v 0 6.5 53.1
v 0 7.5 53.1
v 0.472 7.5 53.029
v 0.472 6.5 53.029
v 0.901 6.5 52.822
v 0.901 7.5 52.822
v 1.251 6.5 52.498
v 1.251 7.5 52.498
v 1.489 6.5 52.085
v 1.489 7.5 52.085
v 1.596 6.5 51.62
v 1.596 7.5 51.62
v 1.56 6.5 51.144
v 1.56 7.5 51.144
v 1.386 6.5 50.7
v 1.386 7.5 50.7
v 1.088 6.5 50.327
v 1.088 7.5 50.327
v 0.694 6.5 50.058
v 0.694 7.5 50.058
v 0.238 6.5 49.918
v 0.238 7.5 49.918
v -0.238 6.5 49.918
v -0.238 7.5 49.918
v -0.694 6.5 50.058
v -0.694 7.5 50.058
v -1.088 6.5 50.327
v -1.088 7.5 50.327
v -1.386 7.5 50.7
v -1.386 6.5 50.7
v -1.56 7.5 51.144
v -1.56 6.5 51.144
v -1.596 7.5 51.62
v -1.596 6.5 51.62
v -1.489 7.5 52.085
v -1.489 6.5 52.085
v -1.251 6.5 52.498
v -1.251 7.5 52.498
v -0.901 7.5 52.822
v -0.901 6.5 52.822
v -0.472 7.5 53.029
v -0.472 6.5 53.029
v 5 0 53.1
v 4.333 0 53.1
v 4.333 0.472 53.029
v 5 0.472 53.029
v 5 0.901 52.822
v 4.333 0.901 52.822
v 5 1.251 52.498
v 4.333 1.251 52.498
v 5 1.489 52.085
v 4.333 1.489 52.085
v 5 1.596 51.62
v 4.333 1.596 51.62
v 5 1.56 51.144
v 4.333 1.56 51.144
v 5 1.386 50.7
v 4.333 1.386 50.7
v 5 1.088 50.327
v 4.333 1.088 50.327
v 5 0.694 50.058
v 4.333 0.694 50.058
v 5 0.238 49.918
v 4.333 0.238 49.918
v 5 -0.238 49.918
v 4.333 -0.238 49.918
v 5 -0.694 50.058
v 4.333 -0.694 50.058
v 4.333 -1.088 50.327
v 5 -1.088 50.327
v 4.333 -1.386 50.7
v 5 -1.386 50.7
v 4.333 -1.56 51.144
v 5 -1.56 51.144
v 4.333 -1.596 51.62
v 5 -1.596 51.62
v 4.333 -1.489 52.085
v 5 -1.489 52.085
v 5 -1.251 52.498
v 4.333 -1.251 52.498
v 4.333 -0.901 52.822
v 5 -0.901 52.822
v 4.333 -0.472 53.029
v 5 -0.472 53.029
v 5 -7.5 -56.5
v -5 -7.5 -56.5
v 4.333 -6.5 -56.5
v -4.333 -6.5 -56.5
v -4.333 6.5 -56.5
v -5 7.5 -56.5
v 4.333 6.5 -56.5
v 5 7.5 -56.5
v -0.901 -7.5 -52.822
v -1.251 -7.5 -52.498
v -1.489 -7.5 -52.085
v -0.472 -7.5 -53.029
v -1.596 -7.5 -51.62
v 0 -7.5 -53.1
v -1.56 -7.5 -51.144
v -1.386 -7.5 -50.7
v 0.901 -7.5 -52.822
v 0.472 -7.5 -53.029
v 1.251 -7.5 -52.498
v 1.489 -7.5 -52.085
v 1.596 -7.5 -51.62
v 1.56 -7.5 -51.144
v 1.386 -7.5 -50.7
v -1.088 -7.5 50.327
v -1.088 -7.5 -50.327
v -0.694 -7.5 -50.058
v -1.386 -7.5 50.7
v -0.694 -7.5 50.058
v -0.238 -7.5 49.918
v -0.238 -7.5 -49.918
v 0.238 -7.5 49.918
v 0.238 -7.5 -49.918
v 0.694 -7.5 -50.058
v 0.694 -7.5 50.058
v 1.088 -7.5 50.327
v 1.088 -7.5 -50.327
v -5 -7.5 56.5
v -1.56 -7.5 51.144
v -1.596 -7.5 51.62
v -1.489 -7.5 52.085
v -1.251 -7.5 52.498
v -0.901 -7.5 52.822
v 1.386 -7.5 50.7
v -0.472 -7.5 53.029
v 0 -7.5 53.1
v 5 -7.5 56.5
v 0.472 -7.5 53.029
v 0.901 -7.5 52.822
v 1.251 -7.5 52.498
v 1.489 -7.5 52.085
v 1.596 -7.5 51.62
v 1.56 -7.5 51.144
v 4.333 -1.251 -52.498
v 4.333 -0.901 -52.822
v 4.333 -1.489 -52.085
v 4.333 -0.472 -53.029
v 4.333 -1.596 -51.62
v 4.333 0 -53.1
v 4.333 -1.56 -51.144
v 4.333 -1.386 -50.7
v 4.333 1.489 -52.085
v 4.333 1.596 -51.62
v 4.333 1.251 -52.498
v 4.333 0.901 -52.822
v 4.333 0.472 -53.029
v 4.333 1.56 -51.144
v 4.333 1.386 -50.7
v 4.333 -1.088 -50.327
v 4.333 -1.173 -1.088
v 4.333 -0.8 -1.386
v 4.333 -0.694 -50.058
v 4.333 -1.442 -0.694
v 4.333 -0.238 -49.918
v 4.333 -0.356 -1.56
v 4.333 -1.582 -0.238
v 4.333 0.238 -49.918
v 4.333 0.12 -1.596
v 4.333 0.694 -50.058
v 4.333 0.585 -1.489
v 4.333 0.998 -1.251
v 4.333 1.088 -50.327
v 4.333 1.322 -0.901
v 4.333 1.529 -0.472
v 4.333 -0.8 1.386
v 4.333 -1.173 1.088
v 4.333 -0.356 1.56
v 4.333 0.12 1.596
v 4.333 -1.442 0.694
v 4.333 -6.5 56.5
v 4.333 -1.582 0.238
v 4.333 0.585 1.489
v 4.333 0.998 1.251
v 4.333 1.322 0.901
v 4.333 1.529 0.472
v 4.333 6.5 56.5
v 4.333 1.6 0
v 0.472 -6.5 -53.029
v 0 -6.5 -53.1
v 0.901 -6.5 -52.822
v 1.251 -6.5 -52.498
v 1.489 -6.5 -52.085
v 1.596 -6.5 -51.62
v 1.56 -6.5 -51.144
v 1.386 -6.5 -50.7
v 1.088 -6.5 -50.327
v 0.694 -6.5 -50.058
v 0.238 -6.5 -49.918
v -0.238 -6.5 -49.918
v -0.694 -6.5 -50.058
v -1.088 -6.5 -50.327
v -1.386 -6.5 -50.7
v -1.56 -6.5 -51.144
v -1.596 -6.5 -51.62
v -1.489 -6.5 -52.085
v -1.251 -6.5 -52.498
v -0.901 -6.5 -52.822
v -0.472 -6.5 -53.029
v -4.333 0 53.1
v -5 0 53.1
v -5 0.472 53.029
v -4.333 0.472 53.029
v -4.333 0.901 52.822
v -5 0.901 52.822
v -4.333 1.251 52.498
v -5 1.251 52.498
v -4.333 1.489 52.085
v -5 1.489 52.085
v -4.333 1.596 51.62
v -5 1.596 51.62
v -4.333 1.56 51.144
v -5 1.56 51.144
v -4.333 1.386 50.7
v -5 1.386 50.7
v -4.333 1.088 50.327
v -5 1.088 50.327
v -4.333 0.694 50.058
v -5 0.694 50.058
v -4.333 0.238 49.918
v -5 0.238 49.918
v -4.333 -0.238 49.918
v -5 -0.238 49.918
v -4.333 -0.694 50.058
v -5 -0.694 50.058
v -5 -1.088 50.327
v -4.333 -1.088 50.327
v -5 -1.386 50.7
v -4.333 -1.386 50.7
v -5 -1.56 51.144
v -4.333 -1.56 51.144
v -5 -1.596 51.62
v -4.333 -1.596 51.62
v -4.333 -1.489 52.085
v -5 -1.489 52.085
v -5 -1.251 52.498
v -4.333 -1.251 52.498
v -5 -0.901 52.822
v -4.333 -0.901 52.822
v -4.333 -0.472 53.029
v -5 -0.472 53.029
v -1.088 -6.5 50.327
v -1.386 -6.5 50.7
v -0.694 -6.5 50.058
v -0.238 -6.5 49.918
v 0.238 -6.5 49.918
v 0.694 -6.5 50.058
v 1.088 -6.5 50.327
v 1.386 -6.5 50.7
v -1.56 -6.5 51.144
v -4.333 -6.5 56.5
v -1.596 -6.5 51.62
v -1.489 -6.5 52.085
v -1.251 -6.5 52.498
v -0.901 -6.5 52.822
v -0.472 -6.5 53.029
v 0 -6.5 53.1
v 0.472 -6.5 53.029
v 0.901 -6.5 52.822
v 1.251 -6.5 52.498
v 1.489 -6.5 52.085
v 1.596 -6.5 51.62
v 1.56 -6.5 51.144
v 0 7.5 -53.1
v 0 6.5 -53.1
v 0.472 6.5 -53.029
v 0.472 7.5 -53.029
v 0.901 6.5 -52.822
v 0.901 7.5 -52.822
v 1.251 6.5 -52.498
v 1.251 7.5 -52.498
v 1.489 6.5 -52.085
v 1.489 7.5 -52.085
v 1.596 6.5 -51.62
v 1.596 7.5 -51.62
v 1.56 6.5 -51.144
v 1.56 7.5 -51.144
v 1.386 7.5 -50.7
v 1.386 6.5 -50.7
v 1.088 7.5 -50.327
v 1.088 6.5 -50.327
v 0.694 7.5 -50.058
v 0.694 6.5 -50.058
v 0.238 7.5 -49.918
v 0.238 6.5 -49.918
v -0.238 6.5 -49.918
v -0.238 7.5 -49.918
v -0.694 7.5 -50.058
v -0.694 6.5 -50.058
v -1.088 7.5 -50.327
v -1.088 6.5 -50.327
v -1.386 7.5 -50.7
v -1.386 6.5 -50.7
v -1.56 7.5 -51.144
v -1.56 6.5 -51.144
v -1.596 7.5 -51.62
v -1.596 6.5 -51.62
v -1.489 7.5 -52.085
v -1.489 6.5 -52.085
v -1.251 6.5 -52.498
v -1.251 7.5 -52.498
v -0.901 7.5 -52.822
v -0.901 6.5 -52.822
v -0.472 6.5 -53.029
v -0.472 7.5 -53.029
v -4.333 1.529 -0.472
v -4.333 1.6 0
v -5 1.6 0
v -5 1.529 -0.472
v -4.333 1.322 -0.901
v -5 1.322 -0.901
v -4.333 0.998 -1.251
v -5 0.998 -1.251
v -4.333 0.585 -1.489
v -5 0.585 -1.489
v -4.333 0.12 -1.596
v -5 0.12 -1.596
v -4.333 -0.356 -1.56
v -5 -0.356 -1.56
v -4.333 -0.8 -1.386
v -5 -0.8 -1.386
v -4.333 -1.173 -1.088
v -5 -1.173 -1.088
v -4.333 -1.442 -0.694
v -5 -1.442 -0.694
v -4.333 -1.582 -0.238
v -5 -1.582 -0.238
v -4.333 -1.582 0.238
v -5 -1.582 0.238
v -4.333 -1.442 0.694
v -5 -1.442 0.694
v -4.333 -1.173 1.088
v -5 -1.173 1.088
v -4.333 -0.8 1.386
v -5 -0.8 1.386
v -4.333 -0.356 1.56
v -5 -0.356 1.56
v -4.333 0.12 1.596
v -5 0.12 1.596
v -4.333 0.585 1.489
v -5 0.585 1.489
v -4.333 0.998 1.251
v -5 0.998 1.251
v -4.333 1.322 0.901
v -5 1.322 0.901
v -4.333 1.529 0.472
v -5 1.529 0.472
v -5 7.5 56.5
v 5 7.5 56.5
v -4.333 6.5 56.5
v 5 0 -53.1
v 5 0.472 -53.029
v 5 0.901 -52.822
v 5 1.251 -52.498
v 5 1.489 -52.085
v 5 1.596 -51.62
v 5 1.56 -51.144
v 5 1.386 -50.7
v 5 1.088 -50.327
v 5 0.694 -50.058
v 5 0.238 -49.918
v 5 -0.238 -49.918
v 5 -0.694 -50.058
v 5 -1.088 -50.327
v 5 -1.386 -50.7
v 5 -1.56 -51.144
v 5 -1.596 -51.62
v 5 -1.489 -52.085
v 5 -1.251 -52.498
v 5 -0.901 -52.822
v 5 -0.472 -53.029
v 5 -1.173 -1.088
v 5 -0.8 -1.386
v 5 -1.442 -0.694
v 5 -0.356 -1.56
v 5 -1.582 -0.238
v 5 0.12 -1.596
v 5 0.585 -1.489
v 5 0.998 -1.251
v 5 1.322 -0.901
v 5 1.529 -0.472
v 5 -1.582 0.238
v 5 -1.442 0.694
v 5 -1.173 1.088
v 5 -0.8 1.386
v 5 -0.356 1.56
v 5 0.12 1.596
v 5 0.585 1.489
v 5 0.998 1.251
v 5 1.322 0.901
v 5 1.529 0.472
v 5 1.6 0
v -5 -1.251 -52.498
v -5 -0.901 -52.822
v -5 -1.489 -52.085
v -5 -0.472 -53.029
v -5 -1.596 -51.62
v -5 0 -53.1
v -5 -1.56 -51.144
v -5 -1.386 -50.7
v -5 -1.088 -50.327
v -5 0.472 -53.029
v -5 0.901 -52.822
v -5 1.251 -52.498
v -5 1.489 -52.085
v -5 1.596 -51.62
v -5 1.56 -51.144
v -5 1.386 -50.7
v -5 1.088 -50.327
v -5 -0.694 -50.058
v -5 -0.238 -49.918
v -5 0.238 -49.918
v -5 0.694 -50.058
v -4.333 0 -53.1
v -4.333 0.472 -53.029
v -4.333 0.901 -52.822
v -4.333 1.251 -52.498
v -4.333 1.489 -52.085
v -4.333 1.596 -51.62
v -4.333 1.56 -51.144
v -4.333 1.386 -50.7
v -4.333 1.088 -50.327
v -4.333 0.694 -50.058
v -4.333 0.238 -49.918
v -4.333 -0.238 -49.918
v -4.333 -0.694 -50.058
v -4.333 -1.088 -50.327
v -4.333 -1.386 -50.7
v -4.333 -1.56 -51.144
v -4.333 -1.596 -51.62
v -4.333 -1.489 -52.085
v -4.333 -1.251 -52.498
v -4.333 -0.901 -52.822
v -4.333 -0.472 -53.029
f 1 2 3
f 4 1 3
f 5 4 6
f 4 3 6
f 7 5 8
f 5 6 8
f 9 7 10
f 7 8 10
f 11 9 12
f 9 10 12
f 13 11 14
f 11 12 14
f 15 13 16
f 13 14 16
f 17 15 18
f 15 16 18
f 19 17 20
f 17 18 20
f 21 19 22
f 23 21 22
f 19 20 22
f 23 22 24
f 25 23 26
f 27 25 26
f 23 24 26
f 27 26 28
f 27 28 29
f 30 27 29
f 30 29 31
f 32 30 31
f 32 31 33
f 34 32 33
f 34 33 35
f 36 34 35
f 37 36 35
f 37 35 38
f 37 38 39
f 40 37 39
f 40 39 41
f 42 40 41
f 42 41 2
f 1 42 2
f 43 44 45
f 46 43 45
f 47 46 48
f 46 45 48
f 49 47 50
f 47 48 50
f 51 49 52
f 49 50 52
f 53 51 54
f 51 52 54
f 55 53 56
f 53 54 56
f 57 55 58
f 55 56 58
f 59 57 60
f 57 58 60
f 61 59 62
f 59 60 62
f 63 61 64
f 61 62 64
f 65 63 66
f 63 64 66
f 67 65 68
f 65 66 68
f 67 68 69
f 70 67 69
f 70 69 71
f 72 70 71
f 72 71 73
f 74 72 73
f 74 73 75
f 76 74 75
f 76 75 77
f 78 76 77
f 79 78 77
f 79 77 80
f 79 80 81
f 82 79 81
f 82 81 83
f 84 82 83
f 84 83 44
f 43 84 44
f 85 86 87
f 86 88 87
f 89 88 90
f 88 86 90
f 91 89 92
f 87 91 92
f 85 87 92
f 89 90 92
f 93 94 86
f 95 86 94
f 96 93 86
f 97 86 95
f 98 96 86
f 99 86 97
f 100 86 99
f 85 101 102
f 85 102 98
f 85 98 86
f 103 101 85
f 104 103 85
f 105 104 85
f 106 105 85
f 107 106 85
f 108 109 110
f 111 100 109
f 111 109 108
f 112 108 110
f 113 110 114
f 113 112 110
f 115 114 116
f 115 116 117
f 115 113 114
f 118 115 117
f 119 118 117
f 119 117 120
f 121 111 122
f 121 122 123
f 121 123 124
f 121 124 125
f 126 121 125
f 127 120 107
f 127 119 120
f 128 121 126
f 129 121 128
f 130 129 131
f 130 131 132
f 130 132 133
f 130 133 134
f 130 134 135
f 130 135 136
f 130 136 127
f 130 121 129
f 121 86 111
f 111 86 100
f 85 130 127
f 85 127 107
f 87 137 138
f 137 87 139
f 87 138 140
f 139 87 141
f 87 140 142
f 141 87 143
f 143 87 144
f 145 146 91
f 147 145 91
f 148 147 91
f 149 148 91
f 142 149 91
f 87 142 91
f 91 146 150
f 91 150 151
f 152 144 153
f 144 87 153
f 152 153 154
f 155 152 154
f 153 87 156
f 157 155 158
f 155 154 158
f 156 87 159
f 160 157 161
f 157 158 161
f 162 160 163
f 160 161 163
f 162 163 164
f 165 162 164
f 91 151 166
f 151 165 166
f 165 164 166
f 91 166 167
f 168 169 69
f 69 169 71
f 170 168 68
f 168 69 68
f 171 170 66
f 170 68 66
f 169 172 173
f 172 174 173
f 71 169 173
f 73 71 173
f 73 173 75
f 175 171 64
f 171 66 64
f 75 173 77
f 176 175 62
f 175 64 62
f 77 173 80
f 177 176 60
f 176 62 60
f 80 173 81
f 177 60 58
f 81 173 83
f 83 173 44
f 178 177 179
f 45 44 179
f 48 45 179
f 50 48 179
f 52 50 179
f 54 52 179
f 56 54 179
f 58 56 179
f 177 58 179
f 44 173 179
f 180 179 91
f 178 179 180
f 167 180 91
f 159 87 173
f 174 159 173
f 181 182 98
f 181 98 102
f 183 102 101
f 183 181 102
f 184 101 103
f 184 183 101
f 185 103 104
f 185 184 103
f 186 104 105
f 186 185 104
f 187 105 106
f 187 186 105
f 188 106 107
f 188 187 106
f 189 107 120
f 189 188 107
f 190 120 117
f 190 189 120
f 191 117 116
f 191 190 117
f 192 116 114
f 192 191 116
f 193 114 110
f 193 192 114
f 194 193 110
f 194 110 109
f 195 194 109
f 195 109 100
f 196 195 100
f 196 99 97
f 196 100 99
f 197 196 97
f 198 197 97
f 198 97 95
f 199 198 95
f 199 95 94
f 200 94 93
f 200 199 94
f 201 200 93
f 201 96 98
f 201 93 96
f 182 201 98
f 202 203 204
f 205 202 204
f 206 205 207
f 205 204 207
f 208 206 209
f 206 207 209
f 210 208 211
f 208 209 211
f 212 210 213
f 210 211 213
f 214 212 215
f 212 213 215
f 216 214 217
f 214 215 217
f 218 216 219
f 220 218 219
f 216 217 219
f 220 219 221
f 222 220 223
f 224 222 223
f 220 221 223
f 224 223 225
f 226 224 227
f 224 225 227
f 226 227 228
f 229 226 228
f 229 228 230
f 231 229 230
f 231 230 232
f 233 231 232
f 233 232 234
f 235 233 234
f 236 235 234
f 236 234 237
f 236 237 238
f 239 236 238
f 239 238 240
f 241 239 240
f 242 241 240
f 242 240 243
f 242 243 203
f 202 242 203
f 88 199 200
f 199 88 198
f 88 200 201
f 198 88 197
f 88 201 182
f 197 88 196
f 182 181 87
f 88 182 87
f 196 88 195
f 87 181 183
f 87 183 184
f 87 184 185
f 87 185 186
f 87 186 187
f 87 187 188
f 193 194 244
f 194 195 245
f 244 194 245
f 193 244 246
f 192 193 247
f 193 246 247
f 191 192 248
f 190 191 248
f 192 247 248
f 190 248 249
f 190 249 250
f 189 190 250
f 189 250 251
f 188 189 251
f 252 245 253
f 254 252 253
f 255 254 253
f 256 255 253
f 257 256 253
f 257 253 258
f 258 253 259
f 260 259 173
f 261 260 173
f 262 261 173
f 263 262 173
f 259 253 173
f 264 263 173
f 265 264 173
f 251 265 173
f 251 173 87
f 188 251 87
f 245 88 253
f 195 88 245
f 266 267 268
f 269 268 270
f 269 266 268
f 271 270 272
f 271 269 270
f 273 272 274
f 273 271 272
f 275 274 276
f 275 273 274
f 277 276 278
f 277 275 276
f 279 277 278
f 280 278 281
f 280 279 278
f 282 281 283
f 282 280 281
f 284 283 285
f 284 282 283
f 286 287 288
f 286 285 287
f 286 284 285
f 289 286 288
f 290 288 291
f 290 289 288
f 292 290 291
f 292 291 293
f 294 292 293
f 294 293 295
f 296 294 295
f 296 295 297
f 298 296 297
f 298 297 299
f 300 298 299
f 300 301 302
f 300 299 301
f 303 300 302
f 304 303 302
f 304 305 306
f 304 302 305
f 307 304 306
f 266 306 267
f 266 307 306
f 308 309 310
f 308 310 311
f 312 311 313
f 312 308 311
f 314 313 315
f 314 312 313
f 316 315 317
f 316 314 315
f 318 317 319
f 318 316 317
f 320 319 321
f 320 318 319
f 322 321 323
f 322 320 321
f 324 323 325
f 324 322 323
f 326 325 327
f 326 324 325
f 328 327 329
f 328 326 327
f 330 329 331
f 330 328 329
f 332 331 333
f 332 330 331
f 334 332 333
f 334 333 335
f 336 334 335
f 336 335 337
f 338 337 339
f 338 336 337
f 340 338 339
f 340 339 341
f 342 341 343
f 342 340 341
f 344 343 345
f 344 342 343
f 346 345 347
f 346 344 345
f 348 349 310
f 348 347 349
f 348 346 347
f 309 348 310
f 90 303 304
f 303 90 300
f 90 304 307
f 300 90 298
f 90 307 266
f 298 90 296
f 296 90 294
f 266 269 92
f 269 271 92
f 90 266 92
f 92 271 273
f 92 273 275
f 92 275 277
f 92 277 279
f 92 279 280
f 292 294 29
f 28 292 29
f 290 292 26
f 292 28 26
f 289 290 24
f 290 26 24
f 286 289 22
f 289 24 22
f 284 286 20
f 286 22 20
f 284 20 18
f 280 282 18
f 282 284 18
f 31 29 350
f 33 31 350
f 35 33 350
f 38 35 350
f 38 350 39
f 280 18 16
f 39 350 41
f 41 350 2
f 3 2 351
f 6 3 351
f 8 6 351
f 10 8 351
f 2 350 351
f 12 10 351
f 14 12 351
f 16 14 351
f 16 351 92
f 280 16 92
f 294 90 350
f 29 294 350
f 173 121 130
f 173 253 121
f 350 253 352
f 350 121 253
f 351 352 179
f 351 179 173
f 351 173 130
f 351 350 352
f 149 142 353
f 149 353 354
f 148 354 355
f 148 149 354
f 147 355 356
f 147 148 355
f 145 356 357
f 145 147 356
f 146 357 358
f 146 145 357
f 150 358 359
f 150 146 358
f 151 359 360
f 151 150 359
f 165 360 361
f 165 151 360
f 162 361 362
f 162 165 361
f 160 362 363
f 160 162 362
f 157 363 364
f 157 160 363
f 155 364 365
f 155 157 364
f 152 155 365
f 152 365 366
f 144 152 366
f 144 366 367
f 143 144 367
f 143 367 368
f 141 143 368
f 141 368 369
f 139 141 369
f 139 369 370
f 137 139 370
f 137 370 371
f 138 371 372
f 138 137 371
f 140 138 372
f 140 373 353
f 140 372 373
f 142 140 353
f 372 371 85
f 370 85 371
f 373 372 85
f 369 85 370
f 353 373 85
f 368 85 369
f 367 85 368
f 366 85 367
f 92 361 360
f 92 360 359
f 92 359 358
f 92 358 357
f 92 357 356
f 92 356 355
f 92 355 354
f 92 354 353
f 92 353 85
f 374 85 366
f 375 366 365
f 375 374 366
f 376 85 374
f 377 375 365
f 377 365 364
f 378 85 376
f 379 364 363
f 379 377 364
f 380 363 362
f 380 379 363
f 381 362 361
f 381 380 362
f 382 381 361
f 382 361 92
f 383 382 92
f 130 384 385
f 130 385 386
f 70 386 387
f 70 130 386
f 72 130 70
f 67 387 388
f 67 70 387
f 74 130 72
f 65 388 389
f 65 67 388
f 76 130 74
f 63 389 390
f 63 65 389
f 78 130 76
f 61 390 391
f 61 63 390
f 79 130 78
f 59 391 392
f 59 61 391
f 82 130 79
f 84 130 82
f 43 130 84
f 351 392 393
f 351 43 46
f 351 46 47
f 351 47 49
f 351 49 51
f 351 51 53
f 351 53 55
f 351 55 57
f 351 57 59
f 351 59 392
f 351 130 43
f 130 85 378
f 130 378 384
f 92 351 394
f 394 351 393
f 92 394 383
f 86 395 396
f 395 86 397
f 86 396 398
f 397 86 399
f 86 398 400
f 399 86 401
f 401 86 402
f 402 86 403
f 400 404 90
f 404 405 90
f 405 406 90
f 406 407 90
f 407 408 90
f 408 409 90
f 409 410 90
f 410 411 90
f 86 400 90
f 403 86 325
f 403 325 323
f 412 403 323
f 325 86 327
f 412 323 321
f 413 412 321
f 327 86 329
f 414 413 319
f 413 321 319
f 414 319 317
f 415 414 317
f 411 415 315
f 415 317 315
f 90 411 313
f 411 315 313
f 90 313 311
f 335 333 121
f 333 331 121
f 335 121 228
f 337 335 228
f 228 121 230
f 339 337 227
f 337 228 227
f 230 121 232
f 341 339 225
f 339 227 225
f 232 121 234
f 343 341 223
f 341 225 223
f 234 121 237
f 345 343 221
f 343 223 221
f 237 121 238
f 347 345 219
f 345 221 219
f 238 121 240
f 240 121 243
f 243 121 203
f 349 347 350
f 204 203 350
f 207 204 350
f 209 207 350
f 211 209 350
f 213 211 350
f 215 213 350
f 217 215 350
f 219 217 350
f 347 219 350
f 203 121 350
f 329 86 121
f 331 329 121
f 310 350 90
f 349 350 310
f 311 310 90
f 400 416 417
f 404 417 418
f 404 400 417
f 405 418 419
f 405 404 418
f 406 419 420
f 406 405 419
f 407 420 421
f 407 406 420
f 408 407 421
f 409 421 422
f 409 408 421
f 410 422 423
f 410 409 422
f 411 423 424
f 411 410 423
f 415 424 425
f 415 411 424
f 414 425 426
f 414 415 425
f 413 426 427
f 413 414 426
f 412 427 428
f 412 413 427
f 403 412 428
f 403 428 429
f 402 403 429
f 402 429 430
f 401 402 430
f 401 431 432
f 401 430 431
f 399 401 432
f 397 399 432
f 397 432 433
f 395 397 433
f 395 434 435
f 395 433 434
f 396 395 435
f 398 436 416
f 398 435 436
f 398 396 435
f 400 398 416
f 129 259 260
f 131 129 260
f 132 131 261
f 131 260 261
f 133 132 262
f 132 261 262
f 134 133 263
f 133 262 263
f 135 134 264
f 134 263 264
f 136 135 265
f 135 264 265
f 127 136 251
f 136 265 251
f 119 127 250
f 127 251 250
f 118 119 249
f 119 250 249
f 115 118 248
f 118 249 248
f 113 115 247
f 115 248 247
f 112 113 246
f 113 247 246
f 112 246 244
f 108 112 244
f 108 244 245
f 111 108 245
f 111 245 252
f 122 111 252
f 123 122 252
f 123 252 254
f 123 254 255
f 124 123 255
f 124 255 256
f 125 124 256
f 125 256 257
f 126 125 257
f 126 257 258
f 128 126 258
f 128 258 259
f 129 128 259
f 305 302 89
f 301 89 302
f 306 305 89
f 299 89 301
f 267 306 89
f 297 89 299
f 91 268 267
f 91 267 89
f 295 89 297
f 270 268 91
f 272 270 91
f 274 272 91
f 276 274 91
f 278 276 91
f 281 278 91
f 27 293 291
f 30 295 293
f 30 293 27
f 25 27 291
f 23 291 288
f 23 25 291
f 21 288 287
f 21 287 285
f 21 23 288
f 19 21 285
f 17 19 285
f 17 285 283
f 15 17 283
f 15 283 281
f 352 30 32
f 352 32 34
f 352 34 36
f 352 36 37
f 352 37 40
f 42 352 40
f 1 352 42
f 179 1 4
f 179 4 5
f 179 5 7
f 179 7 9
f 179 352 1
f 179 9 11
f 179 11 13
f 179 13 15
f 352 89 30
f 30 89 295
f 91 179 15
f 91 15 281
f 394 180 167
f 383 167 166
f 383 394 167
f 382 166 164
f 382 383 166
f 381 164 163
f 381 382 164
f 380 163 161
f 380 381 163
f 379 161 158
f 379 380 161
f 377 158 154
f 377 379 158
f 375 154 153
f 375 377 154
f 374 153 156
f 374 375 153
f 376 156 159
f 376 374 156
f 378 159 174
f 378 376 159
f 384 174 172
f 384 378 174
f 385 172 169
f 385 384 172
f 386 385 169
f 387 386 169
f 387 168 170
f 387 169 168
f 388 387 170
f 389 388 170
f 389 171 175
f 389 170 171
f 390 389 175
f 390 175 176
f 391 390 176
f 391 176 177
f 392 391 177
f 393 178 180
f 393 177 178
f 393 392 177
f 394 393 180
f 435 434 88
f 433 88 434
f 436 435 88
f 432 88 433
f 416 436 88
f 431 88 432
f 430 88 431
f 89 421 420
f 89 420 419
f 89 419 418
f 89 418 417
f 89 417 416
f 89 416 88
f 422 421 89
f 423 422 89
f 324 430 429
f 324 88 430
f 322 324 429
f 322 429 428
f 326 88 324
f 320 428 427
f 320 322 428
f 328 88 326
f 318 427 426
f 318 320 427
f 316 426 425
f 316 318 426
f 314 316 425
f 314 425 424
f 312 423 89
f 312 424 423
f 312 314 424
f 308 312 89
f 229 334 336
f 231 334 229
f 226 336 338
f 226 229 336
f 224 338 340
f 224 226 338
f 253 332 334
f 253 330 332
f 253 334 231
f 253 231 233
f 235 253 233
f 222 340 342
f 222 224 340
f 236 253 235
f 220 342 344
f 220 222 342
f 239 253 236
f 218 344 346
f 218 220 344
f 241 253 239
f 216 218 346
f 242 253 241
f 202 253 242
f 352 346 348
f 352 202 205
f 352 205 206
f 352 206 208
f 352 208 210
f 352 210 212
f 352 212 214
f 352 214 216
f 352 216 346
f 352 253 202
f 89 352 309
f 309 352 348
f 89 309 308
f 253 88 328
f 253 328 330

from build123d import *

# Parameters (mm, degrees)
SKETCH_1_W          = 10
SKETCH_1_H          = 15
SKETCH_1_W_2        = 8.666666666
SKETCH_1_H_2        = 13
EXTRUDE_1_DEPTH     = 56.5
SKETCH_2_R          = 1.6
CUT_EXTRUDE_1_DEPTH = 58.866225037
SKETCH_3_R          = 1.6
CUT_EXTRUDE_2_DEPTH = 59.67069115
SKETCH_4_R          = 1.6
CUT_EXTRUDE_3_DEPTH = 58.866225037


with BuildPart() as part:
    # ｽｹｯﾁ1 → ﾎﾞｽ - 押し出し1 (new body)
    with BuildSketch(Plane.XY):
        Rectangle(SKETCH_1_W, SKETCH_1_H)
        Rectangle(SKETCH_1_W_2, SKETCH_1_H_2, mode=Mode.SUBTRACT)
    extrude_1 = extrude(amount=EXTRUDE_1_DEPTH)

    # ｽｹｯﾁ2 → ｶｯﾄ - 押し出し1 (cut, through all)
    with BuildSketch(Plane(origin=(5, 0, 0), x_dir=(0, 0, -1), z_dir=(1, 0, 0))):
        Circle(SKETCH_2_R)
    cut_extrude_1 = extrude(amount=-CUT_EXTRUDE_1_DEPTH, mode=Mode.SUBTRACT)

    # ｽｹｯﾁ3 → ｶｯﾄ - 押し出し2 (cut, through all)
    with BuildSketch(Plane(origin=(0, 7.5, 0), x_dir=(1, 0, 0), z_dir=(0, 1, 0))):
        with Locations(Location((0, -51.5, 0), (0, 0, 270))):
            Circle(SKETCH_3_R)
    cut_extrude_2 = extrude(amount=-CUT_EXTRUDE_2_DEPTH, mode=Mode.SUBTRACT)

    # ｽｹｯﾁ4 → ｶｯﾄ - 押し出し3 (cut, through all)
    with BuildSketch(Plane.ZY.offset(5)):
        with Locations((51.5, 0)):
            Circle(SKETCH_4_R)
    cut_extrude_3 = extrude(amount=-CUT_EXTRUDE_3_DEPTH, mode=Mode.SUBTRACT)

    # ﾐﾗｰ1: ﾎﾞｽ - 押し出し1, ｶｯﾄ - 押し出し1, ｶｯﾄ - 押し出し2, ｶｯﾄ - 押し出し3 across plane
    add(extrude_1.mirror(Plane(origin=(0, 0, 0), x_dir=(1, 0, 0), z_dir=(0, 0, -1))))
    add(cut_extrude_1.mirror(Plane(origin=(0, 0, 0), x_dir=(1, 0, 0), z_dir=(0, 0, -1))), mode=Mode.SUBTRACT)
    add(cut_extrude_2.mirror(Plane(origin=(0, 0, 0), x_dir=(1, 0, 0), z_dir=(0, 0, -1))), mode=Mode.SUBTRACT)
    add(cut_extrude_3.mirror(Plane(origin=(0, 0, 0), x_dir=(1, 0, 0), z_dir=(0, 0, -1))), mode=Mode.SUBTRACT)


solid = part.part
